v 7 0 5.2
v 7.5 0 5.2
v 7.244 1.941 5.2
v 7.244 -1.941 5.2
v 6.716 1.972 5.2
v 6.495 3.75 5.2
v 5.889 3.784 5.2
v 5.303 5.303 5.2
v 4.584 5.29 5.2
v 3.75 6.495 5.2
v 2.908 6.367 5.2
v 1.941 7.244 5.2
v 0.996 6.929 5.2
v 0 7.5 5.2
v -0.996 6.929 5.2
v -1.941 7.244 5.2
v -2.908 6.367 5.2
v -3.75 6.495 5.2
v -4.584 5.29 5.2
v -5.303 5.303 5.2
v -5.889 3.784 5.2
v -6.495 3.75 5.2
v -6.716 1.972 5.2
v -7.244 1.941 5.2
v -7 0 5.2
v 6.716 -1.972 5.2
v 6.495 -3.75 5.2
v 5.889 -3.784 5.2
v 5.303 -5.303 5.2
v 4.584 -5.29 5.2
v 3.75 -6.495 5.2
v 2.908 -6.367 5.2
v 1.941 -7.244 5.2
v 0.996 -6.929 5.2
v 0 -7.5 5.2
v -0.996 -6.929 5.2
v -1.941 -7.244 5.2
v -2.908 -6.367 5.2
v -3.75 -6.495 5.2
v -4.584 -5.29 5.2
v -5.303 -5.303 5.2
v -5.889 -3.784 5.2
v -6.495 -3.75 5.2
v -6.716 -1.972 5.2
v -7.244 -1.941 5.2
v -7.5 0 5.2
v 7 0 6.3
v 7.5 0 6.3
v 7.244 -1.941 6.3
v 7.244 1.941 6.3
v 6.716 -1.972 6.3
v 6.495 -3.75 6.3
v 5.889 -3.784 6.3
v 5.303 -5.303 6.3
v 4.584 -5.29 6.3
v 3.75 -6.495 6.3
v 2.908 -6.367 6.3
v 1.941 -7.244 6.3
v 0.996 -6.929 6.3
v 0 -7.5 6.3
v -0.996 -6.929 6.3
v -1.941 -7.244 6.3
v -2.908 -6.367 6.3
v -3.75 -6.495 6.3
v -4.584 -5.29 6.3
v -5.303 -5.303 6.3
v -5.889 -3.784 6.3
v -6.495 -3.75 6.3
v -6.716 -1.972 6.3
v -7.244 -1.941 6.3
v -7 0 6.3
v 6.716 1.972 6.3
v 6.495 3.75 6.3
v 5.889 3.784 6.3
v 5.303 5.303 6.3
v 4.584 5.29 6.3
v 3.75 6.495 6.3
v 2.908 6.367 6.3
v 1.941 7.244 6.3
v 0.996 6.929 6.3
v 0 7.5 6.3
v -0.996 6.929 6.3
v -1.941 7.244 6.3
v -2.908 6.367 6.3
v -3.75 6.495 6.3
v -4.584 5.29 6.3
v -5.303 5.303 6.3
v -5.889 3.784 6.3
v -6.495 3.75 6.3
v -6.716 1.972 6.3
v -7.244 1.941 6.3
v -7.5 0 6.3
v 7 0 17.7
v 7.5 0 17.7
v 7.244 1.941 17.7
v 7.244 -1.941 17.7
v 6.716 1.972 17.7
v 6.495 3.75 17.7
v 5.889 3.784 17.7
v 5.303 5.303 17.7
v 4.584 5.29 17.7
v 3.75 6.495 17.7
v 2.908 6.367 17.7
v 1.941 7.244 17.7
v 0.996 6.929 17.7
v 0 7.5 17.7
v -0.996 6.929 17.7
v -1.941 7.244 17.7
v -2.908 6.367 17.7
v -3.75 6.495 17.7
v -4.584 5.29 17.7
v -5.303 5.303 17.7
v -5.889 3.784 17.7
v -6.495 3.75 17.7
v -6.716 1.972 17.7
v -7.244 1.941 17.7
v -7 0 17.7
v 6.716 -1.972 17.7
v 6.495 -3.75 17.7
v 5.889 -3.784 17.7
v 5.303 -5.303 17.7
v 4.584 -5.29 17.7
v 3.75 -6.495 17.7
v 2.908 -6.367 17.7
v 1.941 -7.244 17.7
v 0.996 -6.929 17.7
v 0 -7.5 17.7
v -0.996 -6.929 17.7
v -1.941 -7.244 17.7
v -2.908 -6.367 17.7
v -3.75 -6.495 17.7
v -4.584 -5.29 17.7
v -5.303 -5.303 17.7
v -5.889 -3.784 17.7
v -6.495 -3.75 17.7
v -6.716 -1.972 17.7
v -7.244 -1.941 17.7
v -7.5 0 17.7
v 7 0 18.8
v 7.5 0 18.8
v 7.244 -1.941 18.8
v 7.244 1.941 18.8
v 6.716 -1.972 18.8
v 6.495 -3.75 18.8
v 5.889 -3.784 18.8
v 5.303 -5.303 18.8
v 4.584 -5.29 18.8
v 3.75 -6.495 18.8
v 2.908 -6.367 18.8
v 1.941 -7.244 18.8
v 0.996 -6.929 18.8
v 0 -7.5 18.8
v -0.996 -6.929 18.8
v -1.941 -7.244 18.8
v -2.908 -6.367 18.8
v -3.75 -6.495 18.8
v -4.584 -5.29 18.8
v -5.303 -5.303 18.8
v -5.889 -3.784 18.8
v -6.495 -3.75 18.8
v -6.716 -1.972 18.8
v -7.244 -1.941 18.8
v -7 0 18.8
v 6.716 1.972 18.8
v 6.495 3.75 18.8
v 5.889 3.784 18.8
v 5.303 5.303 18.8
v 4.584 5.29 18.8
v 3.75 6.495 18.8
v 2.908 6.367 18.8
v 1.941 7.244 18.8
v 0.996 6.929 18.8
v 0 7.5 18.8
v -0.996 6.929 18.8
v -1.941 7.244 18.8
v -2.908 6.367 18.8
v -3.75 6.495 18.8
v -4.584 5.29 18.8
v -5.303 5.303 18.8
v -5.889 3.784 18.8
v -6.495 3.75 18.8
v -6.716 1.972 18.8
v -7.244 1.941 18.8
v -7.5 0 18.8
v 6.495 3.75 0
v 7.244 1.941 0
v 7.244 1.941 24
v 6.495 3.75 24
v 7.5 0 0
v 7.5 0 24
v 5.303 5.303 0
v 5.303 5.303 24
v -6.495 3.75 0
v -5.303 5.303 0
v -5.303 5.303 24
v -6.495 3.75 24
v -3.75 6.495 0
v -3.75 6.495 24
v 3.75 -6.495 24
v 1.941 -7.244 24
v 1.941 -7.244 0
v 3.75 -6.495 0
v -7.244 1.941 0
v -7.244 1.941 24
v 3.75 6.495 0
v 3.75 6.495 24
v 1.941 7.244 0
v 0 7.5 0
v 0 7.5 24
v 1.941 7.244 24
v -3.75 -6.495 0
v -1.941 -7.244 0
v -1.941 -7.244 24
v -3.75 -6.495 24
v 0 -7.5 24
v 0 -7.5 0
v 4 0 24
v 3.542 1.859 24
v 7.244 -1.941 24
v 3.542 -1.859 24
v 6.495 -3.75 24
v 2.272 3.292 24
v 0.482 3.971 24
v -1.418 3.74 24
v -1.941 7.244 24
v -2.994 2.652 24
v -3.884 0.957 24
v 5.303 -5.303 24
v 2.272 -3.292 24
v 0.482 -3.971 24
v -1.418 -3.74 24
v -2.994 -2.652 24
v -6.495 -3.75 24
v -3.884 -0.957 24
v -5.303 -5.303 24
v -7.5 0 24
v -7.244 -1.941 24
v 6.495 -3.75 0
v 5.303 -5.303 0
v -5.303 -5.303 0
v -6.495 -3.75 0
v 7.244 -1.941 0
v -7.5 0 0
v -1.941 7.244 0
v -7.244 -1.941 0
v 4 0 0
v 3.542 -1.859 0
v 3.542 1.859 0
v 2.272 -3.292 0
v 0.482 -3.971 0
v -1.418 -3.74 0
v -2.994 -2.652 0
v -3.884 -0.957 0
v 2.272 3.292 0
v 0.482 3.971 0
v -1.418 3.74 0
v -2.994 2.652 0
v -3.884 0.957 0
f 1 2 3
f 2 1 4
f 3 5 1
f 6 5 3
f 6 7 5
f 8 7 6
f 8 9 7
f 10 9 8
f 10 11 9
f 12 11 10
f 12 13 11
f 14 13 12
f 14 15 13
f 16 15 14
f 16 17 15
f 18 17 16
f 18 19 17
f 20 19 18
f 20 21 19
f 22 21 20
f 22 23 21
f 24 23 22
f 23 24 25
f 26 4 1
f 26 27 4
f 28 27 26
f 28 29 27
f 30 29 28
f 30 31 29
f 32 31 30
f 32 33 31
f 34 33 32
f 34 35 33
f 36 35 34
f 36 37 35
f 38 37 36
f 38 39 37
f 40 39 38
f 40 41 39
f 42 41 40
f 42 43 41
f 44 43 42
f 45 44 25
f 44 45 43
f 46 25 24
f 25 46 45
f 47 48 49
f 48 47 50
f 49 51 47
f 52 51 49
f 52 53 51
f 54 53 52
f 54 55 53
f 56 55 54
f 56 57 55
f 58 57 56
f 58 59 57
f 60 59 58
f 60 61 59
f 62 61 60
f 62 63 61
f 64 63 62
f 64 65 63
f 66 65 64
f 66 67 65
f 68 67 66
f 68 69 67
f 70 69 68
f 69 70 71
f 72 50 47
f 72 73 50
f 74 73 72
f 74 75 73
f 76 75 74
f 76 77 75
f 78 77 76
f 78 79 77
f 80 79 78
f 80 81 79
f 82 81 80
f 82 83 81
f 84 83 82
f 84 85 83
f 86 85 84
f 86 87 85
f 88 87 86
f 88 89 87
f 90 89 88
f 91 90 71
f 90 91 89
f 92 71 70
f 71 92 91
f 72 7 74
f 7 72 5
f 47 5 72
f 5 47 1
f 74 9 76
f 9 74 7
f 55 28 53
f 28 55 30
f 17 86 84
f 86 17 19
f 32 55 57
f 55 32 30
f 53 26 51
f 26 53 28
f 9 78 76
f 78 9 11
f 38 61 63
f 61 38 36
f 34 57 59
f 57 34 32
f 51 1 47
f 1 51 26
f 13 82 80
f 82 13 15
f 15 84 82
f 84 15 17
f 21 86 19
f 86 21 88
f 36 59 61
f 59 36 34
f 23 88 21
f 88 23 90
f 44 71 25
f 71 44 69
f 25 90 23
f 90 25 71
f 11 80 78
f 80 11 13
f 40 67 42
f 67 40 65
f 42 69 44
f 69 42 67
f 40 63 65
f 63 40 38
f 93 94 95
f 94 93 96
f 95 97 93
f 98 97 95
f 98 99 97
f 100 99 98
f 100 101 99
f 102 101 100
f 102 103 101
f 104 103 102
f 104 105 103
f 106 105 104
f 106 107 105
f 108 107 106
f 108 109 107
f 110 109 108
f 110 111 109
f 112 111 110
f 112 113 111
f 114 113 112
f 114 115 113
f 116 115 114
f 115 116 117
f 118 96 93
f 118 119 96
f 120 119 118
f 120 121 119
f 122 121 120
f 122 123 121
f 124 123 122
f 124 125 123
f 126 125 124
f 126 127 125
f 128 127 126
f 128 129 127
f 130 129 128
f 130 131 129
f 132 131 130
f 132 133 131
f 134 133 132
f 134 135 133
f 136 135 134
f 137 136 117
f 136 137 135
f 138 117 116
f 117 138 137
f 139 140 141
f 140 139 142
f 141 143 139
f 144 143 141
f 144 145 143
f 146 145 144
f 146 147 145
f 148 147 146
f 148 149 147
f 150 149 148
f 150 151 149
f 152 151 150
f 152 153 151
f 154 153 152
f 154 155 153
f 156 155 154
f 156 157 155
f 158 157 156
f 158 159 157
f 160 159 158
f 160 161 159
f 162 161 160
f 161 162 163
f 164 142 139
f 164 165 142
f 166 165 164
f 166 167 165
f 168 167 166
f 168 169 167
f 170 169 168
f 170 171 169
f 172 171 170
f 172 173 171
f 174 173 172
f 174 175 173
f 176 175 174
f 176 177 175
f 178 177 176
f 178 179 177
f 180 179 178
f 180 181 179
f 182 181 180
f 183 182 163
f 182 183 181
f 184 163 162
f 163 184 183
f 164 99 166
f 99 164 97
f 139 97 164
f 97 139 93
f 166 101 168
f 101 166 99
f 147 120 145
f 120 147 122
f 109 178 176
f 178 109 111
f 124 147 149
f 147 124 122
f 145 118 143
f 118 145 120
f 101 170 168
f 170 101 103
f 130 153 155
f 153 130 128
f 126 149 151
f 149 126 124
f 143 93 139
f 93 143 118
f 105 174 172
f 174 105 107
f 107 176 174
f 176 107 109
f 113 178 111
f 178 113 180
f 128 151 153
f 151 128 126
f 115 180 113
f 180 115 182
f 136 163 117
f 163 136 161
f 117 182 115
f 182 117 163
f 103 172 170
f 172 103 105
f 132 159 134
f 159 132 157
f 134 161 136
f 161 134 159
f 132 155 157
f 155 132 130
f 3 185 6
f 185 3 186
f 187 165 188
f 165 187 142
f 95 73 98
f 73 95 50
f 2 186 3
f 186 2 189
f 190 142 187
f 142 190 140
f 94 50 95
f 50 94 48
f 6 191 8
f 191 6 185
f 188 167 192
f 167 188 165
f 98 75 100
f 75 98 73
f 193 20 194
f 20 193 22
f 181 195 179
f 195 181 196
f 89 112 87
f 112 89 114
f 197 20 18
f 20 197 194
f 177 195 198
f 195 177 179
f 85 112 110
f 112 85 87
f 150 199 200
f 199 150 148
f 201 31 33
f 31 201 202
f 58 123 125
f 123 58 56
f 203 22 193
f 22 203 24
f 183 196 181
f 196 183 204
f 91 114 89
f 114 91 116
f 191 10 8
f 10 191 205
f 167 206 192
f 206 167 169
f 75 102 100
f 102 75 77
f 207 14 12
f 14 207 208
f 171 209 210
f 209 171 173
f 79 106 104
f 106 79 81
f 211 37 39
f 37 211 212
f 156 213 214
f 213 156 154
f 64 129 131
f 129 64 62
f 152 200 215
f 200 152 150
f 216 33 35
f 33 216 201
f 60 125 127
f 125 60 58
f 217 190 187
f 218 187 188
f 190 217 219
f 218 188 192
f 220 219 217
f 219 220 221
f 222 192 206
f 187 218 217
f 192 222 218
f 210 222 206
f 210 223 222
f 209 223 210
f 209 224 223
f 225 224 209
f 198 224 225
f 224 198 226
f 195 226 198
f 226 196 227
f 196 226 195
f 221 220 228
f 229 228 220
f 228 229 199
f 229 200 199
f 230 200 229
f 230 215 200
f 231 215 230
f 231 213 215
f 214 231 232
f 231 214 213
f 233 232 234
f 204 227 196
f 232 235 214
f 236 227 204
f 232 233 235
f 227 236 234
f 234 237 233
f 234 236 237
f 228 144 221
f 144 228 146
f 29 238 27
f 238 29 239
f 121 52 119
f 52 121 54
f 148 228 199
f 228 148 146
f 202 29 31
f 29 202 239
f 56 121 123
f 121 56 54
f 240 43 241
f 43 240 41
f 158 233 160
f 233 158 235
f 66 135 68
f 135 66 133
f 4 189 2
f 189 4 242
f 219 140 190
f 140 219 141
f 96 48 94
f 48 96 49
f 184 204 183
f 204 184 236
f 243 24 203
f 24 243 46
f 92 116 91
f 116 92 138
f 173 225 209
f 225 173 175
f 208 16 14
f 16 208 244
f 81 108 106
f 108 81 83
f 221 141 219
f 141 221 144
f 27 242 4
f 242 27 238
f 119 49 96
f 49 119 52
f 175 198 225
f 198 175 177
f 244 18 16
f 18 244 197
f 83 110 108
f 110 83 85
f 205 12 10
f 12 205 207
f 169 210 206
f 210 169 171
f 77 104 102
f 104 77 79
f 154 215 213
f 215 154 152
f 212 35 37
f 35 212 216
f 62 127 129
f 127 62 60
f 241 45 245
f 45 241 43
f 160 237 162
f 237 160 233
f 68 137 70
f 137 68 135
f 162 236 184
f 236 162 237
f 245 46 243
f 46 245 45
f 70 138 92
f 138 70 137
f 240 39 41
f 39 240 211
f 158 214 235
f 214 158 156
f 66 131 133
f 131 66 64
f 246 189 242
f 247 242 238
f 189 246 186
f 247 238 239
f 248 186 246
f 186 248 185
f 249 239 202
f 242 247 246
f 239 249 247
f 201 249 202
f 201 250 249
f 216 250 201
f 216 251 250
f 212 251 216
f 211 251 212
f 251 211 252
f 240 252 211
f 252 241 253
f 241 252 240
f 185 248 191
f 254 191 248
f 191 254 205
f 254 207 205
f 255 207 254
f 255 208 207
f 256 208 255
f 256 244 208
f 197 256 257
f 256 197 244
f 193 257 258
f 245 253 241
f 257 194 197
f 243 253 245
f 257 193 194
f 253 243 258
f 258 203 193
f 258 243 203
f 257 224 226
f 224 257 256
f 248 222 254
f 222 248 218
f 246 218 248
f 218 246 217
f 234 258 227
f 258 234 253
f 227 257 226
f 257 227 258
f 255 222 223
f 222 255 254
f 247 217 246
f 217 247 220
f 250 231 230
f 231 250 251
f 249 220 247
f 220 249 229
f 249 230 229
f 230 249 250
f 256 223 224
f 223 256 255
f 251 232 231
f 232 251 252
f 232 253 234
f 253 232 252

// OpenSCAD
// Module to generated an LM8UU type linear bearing, based on dimesions of
// http://amzn.com/B008RIKN7W.  May or may not work with other bearings.
// Model will be aligned on the y-axis

module lm_bearing(d=8, tolerance=0) {
  length = lookup(d, [
    [8,24]
  ]);
  
  outside_d = lookup(d, [
    [8,15]
  ]);
  
  retainer_w = lookup(d, [
    [8,1.1]
  ]);
  
  retainer_spacing = lookup(d, [
    [8,12.5]
  ]);

  difference() {
    cylinder(d=outside_d, h=length);
    translate([0,0,-0.1])
      cylinder(d=d,h=length+0.2);
    
    translate([0,0,(length-retainer_spacing-retainer_w)/2]) {
      // the 1 mm recess depth is not to a spec
      lm_bearing_retainer_recess(retainer_w, outside_d-1, outside_d);
      translate([0,0,retainer_spacing])
        lm_bearing_retainer_recess(retainer_w, outside_d-1, outside_d);
    }
  }
}

module lm_bearing_retainer_recess(retainer_w,inner_d, outside_d) {
  difference() {
    cylinder(h=retainer_w,d=outside_d+0.1);
    cylinder(h=retainer_w,d=inner_d);
  }
}
 
lm_bearing(8);
